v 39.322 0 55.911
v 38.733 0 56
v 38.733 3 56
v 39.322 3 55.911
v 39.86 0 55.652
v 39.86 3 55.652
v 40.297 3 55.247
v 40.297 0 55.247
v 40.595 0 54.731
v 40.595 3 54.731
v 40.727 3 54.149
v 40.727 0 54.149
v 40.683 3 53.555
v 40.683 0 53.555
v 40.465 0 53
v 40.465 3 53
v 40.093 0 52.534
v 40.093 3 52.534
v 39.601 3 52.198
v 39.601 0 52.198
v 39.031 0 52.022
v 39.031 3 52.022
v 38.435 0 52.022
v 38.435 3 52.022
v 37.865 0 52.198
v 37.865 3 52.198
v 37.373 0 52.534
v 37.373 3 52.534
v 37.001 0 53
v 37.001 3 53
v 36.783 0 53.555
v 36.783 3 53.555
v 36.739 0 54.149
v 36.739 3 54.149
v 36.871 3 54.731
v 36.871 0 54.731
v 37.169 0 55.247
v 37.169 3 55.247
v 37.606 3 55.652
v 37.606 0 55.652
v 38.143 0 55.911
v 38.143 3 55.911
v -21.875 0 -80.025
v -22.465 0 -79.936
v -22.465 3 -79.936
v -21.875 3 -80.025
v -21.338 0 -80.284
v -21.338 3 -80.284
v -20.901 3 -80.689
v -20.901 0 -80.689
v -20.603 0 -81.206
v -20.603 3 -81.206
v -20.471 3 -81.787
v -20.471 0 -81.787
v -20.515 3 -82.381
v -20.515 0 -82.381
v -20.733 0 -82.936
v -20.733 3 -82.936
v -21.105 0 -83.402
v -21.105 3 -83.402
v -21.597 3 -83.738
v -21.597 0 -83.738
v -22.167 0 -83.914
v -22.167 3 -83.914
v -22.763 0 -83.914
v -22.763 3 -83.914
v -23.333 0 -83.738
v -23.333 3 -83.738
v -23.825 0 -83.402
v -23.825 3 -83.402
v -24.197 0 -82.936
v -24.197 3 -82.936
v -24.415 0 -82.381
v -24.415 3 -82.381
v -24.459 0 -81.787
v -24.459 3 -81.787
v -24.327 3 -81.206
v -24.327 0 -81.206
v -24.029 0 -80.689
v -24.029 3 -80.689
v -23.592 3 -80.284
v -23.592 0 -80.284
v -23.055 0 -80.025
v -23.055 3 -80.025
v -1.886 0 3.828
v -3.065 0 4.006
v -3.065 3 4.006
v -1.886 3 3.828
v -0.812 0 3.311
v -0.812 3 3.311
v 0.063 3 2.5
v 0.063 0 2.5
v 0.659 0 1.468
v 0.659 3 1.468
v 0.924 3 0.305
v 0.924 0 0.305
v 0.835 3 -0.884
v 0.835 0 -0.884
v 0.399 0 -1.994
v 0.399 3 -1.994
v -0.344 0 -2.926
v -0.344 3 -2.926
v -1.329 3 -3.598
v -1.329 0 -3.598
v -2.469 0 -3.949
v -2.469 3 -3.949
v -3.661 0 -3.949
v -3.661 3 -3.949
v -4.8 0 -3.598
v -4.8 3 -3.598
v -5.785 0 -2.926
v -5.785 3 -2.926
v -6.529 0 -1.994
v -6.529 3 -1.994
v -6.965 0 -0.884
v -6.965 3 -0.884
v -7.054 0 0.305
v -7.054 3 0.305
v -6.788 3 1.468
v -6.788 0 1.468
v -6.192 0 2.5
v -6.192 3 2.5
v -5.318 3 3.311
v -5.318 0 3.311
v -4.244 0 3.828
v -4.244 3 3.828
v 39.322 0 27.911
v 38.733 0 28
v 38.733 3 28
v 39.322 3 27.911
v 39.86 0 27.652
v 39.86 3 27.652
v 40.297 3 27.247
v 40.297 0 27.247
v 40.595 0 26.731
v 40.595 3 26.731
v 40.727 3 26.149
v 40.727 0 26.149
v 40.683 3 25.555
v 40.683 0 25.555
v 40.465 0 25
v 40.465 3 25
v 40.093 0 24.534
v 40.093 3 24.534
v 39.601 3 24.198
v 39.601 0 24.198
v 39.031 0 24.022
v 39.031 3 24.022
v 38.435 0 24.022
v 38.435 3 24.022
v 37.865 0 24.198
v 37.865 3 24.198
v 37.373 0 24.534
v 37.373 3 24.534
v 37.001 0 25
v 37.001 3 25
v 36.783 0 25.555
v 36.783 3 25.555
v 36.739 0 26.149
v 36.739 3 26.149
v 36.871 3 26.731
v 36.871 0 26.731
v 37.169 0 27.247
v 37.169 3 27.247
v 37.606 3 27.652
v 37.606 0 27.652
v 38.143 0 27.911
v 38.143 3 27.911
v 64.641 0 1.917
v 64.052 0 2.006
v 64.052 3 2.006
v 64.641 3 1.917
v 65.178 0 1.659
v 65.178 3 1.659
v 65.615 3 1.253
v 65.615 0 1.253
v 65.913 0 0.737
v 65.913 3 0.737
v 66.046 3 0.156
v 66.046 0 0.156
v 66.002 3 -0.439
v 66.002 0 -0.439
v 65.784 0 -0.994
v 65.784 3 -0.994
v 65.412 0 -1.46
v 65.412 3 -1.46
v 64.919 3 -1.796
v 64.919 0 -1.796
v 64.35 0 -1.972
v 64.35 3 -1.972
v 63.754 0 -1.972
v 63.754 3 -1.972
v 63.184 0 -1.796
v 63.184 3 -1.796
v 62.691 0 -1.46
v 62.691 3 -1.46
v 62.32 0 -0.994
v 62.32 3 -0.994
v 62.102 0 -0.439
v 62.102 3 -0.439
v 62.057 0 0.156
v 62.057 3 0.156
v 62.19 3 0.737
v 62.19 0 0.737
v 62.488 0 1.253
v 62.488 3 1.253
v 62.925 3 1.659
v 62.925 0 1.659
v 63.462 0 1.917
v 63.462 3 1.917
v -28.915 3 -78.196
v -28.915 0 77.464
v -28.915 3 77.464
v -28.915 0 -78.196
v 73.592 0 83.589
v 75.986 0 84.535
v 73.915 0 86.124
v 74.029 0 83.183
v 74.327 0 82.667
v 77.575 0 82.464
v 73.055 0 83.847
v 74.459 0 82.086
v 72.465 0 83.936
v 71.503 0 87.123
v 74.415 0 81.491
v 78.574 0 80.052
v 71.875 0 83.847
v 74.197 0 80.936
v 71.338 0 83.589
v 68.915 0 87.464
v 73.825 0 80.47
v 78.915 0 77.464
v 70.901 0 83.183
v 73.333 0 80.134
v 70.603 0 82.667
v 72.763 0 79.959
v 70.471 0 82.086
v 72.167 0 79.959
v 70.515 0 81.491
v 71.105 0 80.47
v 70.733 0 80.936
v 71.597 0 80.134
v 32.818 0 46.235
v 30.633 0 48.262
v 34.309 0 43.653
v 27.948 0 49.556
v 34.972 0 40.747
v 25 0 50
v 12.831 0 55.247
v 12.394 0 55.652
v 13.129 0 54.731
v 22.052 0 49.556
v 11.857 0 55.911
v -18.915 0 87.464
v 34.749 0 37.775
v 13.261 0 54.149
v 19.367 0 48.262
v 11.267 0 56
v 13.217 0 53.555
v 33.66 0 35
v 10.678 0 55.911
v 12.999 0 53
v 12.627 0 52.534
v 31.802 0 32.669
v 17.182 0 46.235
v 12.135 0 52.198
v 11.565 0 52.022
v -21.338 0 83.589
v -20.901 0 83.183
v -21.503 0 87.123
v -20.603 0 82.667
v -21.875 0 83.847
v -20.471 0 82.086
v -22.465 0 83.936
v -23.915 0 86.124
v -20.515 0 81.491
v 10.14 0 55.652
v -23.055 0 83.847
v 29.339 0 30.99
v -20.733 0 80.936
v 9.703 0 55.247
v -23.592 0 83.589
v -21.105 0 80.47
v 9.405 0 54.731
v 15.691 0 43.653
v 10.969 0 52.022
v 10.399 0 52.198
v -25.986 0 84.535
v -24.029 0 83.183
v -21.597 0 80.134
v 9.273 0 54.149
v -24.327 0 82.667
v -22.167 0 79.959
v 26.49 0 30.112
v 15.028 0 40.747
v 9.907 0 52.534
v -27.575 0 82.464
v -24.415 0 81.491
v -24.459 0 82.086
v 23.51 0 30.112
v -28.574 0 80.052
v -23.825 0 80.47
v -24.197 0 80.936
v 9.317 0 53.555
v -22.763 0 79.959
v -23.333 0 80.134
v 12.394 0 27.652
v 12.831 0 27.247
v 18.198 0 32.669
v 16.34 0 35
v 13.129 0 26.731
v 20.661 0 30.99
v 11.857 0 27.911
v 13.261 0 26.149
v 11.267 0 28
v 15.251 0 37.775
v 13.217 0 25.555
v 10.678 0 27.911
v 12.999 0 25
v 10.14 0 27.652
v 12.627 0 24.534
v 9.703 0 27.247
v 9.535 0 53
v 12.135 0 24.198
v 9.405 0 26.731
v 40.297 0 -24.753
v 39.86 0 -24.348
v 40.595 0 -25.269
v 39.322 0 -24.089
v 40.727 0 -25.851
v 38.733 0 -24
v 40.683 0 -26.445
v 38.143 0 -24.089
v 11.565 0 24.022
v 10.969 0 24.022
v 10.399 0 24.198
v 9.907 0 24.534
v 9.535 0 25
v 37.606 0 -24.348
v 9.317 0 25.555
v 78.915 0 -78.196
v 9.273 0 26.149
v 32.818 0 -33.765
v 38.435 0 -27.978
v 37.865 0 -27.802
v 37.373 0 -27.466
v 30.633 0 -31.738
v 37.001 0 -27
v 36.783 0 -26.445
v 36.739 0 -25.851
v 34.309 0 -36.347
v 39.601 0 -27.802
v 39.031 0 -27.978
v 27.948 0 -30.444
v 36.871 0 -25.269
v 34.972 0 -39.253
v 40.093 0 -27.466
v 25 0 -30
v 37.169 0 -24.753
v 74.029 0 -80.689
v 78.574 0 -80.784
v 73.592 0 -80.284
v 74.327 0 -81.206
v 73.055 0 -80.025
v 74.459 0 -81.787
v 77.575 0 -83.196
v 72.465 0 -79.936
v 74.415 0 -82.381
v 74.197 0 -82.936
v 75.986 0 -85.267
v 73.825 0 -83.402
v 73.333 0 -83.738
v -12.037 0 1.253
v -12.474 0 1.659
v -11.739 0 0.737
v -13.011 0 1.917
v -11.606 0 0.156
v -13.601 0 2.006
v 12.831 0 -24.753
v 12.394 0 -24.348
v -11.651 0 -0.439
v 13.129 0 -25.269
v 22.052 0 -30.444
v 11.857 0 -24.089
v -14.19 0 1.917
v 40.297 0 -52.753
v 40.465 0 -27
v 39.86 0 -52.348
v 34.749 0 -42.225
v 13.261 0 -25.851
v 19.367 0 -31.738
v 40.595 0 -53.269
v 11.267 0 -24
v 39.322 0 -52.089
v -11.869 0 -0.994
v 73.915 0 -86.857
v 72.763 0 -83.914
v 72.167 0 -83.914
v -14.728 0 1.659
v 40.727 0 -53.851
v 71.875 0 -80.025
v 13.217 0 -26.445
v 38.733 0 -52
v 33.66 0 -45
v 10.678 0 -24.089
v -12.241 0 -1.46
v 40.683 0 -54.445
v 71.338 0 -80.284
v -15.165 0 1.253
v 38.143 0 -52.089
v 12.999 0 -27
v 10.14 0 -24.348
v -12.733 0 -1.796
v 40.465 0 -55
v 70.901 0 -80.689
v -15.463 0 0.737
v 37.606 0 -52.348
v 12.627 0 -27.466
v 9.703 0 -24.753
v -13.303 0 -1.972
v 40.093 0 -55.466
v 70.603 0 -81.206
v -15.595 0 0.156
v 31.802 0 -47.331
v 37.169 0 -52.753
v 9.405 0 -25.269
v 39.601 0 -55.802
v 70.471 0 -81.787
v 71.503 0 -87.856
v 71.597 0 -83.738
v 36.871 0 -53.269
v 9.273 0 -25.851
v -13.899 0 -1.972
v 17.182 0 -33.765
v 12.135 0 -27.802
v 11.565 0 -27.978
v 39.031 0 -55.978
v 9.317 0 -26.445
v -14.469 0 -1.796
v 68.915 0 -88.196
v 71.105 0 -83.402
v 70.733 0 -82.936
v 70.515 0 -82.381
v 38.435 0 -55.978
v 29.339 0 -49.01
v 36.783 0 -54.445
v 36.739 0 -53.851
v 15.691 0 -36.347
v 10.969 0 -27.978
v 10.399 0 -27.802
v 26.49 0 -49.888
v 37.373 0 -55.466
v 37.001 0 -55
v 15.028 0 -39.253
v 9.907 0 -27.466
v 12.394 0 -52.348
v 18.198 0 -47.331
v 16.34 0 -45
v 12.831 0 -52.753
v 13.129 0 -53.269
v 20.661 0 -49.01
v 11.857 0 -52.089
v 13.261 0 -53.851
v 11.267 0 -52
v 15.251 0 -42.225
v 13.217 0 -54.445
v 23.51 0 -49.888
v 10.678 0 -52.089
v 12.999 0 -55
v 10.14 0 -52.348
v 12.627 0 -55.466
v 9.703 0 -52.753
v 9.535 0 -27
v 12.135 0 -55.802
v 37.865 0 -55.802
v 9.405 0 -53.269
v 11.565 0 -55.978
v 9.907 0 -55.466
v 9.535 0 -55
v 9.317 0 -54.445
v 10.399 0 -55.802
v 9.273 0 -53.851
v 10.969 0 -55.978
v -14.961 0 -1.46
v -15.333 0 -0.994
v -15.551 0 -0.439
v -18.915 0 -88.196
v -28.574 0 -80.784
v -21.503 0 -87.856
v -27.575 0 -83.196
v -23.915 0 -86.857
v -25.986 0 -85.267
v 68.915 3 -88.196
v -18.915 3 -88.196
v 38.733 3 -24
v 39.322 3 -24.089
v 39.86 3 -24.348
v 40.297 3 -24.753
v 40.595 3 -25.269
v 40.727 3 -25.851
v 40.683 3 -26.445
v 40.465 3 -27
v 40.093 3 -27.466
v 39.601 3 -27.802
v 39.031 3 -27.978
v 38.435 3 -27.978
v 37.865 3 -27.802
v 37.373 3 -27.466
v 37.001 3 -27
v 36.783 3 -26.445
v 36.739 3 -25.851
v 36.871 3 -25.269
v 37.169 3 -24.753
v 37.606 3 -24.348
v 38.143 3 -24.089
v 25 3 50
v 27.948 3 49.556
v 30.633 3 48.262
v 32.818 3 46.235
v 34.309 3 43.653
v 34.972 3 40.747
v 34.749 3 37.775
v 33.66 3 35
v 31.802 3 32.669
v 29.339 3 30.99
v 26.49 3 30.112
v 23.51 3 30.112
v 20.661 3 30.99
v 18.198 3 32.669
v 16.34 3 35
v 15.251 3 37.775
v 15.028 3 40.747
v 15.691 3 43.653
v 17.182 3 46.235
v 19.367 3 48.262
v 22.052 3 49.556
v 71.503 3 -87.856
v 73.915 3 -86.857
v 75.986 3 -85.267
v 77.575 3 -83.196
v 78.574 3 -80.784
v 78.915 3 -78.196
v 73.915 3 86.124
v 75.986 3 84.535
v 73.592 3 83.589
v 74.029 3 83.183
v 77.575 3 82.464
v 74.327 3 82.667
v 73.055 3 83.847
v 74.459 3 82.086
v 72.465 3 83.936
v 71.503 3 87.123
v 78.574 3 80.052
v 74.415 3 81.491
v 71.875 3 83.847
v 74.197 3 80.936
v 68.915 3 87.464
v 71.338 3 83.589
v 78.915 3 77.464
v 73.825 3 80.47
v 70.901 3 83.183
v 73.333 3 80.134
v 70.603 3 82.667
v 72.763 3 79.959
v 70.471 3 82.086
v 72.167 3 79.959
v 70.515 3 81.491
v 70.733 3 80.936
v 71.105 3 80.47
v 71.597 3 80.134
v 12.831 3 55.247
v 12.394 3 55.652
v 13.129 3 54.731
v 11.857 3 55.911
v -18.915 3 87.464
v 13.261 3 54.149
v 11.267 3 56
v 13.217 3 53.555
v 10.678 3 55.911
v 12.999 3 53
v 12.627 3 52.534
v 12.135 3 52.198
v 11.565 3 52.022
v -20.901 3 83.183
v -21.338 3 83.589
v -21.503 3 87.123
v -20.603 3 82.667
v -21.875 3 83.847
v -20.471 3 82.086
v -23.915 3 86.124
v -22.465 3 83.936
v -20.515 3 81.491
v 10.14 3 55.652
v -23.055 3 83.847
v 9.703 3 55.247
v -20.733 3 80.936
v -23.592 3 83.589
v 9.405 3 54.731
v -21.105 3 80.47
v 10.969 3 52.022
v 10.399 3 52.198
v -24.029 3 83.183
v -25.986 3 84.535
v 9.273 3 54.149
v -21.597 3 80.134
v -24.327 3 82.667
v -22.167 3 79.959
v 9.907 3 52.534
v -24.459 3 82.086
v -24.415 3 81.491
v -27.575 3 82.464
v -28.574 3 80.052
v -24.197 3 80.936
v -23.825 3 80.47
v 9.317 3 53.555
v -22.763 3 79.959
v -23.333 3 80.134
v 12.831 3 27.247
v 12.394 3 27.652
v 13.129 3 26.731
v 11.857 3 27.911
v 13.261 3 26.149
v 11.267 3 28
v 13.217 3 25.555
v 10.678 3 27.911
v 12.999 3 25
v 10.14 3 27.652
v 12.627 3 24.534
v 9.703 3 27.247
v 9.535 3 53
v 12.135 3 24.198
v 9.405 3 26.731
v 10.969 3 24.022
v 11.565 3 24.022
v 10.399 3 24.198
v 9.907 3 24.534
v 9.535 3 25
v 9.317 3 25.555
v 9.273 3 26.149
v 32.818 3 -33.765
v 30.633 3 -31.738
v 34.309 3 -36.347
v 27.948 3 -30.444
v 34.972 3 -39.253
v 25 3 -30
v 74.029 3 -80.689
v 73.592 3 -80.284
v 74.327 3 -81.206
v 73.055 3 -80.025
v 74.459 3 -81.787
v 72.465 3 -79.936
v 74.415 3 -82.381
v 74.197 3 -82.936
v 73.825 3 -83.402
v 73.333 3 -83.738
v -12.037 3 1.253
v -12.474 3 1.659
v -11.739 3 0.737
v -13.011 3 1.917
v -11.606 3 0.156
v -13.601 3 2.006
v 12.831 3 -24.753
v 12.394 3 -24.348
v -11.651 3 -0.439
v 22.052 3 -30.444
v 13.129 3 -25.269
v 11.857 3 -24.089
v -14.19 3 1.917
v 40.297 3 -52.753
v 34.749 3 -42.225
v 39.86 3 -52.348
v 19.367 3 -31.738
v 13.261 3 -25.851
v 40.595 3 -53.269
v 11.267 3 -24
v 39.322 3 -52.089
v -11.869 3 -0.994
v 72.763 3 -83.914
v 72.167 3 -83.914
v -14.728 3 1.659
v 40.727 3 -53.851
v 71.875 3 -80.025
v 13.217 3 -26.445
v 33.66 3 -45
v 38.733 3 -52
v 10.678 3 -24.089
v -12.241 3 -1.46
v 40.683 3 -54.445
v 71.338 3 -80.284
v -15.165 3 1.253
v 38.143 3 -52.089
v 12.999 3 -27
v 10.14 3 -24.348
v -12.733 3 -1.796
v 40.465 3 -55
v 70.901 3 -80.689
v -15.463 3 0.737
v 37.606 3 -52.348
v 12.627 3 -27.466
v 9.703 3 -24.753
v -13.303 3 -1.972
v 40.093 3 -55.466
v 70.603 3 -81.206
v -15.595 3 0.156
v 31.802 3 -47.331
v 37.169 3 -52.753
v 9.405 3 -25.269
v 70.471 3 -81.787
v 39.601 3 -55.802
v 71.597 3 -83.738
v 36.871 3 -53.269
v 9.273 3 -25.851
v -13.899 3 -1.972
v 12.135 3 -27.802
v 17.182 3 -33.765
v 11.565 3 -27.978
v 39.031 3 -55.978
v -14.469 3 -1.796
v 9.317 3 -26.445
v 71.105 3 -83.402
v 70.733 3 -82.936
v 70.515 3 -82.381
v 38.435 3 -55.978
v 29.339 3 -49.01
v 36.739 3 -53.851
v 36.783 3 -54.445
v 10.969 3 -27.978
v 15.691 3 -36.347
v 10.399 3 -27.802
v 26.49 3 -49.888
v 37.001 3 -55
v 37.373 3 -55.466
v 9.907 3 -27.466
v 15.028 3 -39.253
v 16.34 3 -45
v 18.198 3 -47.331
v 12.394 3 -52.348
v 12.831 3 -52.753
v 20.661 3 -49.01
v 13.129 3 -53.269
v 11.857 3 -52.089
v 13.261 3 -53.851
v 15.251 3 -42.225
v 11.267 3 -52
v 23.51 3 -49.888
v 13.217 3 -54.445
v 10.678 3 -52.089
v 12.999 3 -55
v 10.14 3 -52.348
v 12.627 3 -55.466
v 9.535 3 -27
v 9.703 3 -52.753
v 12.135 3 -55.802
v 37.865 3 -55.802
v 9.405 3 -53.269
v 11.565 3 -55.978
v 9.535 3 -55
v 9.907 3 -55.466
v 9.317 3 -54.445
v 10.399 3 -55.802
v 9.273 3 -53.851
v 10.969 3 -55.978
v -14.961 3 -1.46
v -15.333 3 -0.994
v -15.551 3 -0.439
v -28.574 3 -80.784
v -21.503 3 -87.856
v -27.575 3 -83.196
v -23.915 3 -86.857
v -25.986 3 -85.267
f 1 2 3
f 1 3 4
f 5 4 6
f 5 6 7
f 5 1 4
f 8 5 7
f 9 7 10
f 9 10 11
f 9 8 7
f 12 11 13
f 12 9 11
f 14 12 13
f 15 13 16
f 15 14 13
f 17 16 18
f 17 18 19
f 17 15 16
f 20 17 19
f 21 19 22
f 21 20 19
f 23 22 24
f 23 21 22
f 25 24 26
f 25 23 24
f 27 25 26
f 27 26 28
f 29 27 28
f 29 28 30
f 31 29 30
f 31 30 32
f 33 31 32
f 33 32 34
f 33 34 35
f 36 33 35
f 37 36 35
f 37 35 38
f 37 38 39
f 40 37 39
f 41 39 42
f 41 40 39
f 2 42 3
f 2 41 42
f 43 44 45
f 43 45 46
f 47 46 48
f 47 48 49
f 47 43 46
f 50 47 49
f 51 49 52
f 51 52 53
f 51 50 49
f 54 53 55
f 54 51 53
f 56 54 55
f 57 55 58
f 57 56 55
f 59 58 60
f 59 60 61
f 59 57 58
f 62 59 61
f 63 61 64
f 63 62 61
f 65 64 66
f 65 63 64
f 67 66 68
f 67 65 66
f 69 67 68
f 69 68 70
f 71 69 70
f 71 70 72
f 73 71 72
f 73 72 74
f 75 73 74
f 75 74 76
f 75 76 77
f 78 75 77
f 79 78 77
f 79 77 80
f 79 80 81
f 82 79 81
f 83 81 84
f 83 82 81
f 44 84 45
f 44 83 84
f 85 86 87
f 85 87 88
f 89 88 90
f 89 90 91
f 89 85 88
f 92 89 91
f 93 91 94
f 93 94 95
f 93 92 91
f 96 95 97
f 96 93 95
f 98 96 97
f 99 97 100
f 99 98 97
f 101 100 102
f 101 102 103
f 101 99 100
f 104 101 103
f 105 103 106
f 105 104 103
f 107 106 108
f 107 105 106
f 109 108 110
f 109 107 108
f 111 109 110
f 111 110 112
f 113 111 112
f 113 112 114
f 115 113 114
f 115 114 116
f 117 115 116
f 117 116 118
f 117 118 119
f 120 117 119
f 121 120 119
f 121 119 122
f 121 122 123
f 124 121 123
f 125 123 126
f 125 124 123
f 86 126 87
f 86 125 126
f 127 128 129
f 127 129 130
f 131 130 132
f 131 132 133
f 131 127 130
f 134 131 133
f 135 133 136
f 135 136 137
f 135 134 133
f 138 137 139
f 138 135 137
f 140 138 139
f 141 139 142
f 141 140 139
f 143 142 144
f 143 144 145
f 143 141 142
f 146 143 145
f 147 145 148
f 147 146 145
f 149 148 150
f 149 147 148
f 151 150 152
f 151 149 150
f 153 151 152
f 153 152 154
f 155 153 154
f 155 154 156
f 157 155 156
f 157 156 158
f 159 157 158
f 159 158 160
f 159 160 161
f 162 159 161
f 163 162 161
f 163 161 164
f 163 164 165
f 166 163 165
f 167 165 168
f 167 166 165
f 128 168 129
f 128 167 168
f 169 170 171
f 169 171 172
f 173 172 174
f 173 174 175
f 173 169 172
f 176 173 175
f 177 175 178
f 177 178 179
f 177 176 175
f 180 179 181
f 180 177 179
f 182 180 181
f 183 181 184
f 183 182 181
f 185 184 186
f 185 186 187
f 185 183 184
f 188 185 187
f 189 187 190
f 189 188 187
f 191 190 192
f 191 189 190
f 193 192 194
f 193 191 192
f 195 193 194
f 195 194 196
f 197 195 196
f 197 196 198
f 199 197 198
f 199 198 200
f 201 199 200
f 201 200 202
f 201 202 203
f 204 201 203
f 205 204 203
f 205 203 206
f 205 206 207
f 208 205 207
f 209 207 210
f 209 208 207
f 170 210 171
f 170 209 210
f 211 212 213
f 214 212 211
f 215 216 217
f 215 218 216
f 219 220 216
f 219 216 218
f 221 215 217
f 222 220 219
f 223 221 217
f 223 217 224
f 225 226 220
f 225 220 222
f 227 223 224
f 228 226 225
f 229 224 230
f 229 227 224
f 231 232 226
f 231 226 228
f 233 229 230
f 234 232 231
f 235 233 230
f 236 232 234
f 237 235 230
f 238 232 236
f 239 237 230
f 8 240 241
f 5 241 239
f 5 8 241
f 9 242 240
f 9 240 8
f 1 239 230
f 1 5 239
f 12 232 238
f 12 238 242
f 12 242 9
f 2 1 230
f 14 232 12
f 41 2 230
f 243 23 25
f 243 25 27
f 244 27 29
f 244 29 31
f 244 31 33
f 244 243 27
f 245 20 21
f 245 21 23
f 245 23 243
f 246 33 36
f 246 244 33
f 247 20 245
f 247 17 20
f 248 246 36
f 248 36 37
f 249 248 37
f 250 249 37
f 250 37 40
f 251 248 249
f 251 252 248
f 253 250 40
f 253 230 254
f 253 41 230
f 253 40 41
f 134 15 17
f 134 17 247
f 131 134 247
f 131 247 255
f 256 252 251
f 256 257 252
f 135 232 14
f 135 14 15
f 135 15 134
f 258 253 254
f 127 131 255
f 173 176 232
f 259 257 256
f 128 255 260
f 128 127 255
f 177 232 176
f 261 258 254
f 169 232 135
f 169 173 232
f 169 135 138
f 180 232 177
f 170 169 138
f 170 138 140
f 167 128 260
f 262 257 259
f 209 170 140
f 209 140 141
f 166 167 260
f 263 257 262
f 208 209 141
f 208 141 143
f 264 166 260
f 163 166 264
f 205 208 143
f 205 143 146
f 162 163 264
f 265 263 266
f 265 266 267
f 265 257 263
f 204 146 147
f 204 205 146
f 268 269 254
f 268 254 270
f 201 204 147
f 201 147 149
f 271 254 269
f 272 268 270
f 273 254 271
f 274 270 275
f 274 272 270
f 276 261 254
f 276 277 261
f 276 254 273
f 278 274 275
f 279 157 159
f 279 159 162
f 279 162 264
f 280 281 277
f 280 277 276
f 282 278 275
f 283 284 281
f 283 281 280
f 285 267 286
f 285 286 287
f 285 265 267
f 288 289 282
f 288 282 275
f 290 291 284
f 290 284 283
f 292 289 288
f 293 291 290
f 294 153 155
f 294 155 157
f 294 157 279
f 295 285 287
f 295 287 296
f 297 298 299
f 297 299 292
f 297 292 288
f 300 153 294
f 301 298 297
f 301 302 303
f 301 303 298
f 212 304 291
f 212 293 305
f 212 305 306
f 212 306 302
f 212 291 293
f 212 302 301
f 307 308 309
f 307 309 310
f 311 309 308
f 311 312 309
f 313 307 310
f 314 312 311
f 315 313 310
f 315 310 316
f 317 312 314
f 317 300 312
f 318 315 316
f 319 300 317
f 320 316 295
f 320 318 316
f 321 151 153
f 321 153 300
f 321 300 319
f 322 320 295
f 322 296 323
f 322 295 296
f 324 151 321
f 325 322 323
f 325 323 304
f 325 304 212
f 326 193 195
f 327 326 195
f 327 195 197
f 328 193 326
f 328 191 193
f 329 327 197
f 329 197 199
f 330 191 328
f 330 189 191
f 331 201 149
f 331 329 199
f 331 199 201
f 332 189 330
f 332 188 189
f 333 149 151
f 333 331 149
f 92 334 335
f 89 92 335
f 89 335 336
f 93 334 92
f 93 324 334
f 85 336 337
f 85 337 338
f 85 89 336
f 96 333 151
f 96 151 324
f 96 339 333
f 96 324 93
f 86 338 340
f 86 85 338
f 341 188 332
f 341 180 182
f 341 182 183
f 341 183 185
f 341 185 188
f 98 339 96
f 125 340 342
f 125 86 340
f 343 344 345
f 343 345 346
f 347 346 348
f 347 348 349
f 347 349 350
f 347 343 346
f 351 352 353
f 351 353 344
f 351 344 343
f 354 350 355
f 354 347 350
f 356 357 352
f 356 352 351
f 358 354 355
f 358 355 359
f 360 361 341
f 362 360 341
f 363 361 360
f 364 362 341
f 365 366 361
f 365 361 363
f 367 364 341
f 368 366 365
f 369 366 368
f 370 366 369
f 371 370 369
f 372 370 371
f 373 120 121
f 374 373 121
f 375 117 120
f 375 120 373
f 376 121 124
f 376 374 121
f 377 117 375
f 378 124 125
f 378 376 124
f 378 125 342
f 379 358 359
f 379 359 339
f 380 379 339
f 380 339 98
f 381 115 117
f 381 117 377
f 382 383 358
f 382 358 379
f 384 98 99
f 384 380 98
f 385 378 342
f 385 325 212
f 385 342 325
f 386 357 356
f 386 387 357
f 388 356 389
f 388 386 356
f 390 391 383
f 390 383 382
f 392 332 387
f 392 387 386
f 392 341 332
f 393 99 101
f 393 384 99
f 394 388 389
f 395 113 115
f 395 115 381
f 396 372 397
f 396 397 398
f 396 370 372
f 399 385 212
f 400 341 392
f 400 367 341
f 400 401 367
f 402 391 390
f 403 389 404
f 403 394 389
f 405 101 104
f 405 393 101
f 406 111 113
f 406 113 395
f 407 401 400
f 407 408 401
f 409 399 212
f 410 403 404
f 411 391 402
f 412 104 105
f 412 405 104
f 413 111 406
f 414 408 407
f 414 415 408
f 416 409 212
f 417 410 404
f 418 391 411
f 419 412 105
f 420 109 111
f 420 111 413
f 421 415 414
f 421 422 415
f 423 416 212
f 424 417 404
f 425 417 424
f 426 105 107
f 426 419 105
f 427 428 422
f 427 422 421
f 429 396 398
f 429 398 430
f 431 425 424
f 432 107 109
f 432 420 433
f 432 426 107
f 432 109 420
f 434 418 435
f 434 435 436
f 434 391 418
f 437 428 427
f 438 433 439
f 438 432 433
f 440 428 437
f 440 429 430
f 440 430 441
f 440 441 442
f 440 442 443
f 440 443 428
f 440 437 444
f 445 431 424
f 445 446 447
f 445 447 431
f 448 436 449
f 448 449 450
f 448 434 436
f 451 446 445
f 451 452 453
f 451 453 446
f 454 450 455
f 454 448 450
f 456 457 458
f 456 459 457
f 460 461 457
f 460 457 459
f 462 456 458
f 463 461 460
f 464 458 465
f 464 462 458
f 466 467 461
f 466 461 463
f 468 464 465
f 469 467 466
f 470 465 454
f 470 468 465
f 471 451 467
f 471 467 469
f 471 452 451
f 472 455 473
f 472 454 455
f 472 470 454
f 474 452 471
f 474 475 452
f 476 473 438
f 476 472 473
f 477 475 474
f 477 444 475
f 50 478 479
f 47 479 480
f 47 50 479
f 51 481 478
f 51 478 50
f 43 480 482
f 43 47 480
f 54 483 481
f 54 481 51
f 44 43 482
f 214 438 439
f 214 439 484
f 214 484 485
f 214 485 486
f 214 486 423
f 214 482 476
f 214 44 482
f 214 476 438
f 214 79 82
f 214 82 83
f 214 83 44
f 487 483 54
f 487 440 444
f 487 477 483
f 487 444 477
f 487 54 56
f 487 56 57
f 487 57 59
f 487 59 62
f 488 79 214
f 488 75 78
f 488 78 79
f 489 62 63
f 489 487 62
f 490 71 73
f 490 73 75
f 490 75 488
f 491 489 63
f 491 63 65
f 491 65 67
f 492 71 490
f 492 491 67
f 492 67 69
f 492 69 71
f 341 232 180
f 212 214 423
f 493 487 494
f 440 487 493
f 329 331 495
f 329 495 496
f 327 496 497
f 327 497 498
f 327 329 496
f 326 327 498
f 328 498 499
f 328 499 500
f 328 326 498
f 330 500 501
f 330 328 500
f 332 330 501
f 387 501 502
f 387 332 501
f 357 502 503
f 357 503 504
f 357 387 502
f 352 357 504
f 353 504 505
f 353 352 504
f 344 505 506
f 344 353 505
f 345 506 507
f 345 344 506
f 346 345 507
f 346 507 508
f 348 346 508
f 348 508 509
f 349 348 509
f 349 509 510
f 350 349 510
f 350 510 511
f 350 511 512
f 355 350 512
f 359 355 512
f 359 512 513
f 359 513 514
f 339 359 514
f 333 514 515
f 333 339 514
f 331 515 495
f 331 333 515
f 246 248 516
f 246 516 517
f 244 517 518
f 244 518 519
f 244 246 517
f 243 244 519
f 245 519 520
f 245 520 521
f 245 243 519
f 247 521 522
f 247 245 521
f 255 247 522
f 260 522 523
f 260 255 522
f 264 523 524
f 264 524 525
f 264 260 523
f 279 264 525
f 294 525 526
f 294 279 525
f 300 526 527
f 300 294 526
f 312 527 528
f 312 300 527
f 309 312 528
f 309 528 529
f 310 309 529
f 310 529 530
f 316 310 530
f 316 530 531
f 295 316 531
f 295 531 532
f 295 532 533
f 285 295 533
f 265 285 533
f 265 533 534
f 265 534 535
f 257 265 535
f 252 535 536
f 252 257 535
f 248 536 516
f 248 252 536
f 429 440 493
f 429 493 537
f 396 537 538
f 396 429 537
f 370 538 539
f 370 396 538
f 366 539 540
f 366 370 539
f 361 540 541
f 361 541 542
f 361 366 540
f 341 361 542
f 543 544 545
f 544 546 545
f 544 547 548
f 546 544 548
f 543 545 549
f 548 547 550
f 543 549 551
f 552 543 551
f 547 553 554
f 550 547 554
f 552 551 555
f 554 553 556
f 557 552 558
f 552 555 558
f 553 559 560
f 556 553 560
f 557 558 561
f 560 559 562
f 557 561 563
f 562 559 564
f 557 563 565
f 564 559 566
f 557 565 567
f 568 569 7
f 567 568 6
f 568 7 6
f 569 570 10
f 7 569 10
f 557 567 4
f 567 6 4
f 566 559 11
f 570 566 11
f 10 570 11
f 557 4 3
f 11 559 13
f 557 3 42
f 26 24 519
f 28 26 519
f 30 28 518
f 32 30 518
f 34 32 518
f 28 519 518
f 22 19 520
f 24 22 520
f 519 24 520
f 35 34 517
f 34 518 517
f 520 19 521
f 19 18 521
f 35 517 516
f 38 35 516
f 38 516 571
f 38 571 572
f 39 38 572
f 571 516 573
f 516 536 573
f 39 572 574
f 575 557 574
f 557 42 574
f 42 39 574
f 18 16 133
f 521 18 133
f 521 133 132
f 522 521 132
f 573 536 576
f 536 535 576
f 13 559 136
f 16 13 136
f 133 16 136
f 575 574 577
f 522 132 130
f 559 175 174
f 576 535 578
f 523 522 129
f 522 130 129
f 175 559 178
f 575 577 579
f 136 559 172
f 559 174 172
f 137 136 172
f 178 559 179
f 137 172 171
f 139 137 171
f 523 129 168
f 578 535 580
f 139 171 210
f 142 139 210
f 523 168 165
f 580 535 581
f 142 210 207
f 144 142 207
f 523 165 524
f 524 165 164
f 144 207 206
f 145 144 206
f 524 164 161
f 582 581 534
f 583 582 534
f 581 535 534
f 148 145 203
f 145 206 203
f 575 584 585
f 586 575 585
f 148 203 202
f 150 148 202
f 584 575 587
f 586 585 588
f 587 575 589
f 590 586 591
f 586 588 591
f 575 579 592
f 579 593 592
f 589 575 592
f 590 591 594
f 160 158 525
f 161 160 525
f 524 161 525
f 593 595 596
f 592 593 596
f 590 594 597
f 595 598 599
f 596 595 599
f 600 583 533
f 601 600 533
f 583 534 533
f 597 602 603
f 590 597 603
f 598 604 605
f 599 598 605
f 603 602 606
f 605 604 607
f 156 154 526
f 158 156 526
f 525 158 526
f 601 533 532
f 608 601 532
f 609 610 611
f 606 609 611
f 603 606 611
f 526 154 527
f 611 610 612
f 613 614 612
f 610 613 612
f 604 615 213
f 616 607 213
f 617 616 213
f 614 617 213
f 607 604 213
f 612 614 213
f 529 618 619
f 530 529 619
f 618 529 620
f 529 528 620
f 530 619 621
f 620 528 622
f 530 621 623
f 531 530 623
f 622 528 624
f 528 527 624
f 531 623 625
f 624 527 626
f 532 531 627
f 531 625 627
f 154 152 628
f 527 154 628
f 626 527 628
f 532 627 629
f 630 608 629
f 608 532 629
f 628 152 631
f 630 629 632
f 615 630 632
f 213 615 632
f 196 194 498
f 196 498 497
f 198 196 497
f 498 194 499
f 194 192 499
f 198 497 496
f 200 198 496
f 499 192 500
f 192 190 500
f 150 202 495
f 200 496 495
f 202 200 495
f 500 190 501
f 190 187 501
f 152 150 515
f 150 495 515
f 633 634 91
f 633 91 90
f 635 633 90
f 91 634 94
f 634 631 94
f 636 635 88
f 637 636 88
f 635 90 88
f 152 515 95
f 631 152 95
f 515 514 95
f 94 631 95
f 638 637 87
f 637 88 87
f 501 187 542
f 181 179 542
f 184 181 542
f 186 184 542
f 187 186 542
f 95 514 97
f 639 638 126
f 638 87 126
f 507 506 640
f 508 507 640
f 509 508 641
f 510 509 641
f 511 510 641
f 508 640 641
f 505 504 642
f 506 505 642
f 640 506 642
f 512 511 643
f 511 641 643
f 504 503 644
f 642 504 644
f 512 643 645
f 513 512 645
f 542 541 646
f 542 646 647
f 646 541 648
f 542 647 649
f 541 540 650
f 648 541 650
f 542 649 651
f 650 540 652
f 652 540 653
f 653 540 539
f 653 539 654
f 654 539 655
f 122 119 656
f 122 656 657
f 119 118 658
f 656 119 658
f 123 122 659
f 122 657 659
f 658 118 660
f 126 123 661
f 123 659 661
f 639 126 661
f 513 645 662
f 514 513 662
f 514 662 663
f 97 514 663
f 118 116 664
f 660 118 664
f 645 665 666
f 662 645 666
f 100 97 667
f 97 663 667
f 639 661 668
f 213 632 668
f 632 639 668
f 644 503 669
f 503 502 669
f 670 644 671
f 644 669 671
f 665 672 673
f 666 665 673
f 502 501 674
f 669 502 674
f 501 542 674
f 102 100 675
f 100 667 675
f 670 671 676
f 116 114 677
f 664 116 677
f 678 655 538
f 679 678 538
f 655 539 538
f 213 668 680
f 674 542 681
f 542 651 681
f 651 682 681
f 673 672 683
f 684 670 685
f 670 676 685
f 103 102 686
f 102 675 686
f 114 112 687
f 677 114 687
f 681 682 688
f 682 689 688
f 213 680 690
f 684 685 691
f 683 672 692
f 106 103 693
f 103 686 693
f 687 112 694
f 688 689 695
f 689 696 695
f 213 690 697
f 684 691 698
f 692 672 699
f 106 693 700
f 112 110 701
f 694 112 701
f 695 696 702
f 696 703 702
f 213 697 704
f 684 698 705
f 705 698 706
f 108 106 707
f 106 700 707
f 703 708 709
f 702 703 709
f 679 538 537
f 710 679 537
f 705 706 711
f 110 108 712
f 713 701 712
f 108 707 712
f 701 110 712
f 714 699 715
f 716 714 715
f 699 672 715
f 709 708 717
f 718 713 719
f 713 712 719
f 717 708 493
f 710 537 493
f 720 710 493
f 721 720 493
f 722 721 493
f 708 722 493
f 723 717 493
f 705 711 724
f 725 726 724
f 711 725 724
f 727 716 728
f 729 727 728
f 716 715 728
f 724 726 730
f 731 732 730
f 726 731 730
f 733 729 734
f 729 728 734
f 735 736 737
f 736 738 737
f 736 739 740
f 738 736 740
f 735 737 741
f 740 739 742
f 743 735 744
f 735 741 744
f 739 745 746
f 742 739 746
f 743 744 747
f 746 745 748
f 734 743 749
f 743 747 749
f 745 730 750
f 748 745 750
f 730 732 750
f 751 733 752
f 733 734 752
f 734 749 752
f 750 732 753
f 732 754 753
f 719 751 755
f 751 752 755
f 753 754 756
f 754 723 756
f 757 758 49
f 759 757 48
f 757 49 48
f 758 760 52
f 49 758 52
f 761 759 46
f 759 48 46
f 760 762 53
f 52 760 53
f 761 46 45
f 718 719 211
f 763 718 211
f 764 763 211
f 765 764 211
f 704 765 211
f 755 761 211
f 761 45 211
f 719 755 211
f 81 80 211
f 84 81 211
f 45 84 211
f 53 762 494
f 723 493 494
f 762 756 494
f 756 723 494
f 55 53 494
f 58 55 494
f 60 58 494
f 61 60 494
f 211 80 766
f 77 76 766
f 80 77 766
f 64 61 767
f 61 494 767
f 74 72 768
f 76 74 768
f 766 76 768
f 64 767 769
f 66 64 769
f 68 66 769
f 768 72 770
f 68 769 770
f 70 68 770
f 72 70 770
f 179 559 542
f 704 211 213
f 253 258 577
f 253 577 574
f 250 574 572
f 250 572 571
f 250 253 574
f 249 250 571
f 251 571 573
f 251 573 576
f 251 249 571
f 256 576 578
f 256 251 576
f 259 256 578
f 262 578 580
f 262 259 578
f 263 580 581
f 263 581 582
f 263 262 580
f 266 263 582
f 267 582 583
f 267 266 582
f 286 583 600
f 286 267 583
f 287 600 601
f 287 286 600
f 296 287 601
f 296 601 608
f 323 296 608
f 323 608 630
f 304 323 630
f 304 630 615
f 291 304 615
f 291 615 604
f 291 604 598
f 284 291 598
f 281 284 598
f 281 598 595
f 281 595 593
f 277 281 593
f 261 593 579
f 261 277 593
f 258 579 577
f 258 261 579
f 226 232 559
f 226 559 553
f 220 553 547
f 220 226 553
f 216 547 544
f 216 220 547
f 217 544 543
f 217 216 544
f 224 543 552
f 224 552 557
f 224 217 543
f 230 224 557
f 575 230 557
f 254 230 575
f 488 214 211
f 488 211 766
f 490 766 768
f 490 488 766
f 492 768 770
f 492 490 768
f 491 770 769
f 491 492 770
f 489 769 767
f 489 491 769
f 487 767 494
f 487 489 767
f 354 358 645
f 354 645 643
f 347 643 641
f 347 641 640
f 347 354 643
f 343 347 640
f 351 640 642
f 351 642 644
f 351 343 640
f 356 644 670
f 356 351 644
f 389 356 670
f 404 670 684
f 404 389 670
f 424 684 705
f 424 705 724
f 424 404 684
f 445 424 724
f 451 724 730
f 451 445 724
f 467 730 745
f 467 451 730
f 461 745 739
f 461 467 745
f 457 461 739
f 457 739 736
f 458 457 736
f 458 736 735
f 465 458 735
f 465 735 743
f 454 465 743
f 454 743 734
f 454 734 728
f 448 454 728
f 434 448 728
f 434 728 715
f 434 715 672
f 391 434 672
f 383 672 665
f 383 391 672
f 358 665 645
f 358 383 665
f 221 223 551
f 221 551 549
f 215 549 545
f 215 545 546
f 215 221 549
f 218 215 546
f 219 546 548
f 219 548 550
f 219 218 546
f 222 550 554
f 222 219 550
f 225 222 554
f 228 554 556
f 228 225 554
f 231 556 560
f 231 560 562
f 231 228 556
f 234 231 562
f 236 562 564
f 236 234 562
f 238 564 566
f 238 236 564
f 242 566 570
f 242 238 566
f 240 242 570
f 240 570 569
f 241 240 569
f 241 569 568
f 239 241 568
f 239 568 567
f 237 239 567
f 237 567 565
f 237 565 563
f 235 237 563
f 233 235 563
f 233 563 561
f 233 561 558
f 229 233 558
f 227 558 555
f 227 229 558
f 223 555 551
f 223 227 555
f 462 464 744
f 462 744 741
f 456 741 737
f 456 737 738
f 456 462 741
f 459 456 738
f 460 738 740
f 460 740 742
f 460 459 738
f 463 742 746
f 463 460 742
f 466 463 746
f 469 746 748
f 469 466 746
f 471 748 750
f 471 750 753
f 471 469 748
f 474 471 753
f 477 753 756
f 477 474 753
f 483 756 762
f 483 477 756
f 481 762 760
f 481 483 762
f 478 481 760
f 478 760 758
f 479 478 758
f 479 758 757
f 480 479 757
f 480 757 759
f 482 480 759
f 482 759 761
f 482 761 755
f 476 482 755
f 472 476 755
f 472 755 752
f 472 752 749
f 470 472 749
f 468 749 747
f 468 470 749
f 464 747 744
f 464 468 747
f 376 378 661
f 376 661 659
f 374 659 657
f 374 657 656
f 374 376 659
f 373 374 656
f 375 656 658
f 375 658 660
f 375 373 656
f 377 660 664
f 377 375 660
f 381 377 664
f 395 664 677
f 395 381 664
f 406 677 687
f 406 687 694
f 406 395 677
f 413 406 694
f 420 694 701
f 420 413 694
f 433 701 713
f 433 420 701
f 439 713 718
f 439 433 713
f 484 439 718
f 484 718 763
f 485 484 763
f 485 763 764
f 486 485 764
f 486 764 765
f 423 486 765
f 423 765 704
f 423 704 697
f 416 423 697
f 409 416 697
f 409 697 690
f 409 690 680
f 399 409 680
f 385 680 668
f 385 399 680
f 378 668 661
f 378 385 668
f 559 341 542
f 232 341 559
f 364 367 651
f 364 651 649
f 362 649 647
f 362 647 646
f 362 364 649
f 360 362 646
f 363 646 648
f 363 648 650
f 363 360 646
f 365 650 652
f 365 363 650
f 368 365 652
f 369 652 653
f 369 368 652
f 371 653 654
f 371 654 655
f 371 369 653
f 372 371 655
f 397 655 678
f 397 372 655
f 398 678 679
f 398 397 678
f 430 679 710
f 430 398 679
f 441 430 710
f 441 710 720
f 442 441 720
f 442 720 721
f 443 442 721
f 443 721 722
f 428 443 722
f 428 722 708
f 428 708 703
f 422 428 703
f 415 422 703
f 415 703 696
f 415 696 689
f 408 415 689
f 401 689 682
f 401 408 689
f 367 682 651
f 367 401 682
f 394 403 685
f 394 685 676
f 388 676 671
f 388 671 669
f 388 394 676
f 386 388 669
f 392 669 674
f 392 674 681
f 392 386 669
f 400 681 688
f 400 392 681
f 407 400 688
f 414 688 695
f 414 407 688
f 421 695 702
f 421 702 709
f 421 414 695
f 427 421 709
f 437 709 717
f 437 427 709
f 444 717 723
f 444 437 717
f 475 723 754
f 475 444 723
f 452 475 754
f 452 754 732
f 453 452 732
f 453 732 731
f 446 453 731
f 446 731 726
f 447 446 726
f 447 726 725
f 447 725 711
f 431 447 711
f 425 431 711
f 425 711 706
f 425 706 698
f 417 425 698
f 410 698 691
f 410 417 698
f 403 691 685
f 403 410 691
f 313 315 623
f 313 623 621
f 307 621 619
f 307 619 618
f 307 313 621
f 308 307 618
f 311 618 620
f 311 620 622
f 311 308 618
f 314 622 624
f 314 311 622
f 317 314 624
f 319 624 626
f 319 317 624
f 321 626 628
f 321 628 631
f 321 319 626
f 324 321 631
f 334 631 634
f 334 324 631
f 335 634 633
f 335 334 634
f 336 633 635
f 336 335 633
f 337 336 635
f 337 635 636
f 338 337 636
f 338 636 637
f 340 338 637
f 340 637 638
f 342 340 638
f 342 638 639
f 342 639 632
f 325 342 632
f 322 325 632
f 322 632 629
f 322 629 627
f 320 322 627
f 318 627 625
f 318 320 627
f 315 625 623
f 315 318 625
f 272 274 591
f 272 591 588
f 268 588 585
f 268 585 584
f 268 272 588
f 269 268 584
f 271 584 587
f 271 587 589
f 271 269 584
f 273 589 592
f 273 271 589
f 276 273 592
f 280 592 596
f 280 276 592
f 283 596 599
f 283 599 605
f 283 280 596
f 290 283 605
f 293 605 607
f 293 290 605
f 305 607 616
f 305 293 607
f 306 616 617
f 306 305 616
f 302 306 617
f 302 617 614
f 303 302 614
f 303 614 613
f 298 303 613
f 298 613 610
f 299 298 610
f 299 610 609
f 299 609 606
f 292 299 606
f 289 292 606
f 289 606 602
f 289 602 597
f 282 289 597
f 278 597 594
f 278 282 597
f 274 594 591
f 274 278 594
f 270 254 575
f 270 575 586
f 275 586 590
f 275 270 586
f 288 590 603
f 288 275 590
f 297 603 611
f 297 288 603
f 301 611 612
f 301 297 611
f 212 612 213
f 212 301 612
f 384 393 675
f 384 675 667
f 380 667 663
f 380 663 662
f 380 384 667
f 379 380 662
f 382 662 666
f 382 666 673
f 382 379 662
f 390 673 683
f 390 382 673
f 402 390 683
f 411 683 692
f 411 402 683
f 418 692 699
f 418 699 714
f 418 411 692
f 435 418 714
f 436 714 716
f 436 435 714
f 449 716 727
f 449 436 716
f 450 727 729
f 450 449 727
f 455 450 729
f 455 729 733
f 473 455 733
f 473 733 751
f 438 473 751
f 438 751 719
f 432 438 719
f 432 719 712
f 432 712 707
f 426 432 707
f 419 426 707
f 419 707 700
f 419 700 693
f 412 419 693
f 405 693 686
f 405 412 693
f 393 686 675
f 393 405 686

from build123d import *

# Parameters (mm, degrees)
SKETCH_1_R      = 2
SKETCH_1_R_2    = 10
SKETCH_1_R_3    = 4
EXTRUDE_1_DEPTH = 3


with BuildPart() as part:
    # 草图1 → 凸台-拉伸1 (new body)
    with BuildSketch(Plane(origin=(0, 0, 0), x_dir=(1, 0, 0), z_dir=(0, 1, 0))):
        with BuildLine():
            Line((-18.915, 88.196307868), (68.915, 88.196307868))
            ThreePointArc((68.915, 88.196307868), (75.986067812, 85.26737568), (78.915, 78.196307868))
            Line((78.915, 78.196307868), (78.915, -77.463692132))
            ThreePointArc((78.915, -77.463692132), (75.986067812, -84.534759944), (68.915, -87.463692132))
            Line((68.915, -87.463692132), (-18.915, -87.463692132))
            ThreePointArc((-18.915, -87.463692132), (-25.986067812, -84.534759944), (-28.915, -77.463692132))
            Line((-28.915, -77.463692132), (-28.915, 78.196307868))
            ThreePointArc((-28.915, 78.196307868), (-25.986067812, 85.26737568), (-18.915, 88.196307868))
        make_face()
        with Locations(Location((72.465, 81.936307868, 0), (0, 0, 270))):
            Circle(SKETCH_1_R, mode=Mode.SUBTRACT)
        with Locations(Location((72.465, -81.936307868, 0), (0, 0, 270))):
            Circle(SKETCH_1_R, mode=Mode.SUBTRACT)
        with Locations(Location((-22.465, -81.936307868, 0), (0, 0, 270))):
            Circle(SKETCH_1_R, mode=Mode.SUBTRACT)
        with Locations(Location((-22.465, 81.936307868, 0), (0, 0, 270))):
            Circle(SKETCH_1_R, mode=Mode.SUBTRACT)
        with Locations(Location((25, 40, 0), (0, 0, 270))):
            Circle(SKETCH_1_R_2, mode=Mode.SUBTRACT)
        with Locations(Location((11.26703509, 54, 0), (0, 0, 270))):
            Circle(SKETCH_1_R, mode=Mode.SUBTRACT)
        with Locations(Location((38.73296491, 54, 0), (0, 0, 270))):
            Circle(SKETCH_1_R, mode=Mode.SUBTRACT)
        with Locations(Location((38.73296491, 26, 0), (0, 0, 270))):
            Circle(SKETCH_1_R, mode=Mode.SUBTRACT)
        with Locations(Location((11.26703509, 26, 0), (0, 0, 270))):
            Circle(SKETCH_1_R, mode=Mode.SUBTRACT)
        with Locations(Location((11.26703509, -26, 0), (0, 0, 270))):
            Circle(SKETCH_1_R, mode=Mode.SUBTRACT)
        with Locations(Location((11.26703509, -54, 0), (0, 0, 270))):
            Circle(SKETCH_1_R, mode=Mode.SUBTRACT)
        with Locations(Location((25, -40, 0), (0, 0, 270))):
            Circle(SKETCH_1_R_2, mode=Mode.SUBTRACT)
        with Locations(Location((38.73296491, -26, 0), (0, 0, 270))):
            Circle(SKETCH_1_R, mode=Mode.SUBTRACT)
        with Locations(Location((38.73296491, -54, 0), (0, 0, 270))):
            Circle(SKETCH_1_R, mode=Mode.SUBTRACT)
        with Locations(Location((64.051731017, -0.006153743, 0), (0, 0, 270))):
            Circle(SKETCH_1_R, mode=Mode.SUBTRACT)
        with Locations(Location((-3.064799971, -0.006153743, 0), (0, 0, 270))):
            Circle(SKETCH_1_R_3, mode=Mode.SUBTRACT)
        with Locations(Location((-13.600868083, -0.006153743, 0), (0, 0, 270))):
            Circle(SKETCH_1_R, mode=Mode.SUBTRACT)
    extrude(amount=EXTRUDE_1_DEPTH)


solid = part.part
